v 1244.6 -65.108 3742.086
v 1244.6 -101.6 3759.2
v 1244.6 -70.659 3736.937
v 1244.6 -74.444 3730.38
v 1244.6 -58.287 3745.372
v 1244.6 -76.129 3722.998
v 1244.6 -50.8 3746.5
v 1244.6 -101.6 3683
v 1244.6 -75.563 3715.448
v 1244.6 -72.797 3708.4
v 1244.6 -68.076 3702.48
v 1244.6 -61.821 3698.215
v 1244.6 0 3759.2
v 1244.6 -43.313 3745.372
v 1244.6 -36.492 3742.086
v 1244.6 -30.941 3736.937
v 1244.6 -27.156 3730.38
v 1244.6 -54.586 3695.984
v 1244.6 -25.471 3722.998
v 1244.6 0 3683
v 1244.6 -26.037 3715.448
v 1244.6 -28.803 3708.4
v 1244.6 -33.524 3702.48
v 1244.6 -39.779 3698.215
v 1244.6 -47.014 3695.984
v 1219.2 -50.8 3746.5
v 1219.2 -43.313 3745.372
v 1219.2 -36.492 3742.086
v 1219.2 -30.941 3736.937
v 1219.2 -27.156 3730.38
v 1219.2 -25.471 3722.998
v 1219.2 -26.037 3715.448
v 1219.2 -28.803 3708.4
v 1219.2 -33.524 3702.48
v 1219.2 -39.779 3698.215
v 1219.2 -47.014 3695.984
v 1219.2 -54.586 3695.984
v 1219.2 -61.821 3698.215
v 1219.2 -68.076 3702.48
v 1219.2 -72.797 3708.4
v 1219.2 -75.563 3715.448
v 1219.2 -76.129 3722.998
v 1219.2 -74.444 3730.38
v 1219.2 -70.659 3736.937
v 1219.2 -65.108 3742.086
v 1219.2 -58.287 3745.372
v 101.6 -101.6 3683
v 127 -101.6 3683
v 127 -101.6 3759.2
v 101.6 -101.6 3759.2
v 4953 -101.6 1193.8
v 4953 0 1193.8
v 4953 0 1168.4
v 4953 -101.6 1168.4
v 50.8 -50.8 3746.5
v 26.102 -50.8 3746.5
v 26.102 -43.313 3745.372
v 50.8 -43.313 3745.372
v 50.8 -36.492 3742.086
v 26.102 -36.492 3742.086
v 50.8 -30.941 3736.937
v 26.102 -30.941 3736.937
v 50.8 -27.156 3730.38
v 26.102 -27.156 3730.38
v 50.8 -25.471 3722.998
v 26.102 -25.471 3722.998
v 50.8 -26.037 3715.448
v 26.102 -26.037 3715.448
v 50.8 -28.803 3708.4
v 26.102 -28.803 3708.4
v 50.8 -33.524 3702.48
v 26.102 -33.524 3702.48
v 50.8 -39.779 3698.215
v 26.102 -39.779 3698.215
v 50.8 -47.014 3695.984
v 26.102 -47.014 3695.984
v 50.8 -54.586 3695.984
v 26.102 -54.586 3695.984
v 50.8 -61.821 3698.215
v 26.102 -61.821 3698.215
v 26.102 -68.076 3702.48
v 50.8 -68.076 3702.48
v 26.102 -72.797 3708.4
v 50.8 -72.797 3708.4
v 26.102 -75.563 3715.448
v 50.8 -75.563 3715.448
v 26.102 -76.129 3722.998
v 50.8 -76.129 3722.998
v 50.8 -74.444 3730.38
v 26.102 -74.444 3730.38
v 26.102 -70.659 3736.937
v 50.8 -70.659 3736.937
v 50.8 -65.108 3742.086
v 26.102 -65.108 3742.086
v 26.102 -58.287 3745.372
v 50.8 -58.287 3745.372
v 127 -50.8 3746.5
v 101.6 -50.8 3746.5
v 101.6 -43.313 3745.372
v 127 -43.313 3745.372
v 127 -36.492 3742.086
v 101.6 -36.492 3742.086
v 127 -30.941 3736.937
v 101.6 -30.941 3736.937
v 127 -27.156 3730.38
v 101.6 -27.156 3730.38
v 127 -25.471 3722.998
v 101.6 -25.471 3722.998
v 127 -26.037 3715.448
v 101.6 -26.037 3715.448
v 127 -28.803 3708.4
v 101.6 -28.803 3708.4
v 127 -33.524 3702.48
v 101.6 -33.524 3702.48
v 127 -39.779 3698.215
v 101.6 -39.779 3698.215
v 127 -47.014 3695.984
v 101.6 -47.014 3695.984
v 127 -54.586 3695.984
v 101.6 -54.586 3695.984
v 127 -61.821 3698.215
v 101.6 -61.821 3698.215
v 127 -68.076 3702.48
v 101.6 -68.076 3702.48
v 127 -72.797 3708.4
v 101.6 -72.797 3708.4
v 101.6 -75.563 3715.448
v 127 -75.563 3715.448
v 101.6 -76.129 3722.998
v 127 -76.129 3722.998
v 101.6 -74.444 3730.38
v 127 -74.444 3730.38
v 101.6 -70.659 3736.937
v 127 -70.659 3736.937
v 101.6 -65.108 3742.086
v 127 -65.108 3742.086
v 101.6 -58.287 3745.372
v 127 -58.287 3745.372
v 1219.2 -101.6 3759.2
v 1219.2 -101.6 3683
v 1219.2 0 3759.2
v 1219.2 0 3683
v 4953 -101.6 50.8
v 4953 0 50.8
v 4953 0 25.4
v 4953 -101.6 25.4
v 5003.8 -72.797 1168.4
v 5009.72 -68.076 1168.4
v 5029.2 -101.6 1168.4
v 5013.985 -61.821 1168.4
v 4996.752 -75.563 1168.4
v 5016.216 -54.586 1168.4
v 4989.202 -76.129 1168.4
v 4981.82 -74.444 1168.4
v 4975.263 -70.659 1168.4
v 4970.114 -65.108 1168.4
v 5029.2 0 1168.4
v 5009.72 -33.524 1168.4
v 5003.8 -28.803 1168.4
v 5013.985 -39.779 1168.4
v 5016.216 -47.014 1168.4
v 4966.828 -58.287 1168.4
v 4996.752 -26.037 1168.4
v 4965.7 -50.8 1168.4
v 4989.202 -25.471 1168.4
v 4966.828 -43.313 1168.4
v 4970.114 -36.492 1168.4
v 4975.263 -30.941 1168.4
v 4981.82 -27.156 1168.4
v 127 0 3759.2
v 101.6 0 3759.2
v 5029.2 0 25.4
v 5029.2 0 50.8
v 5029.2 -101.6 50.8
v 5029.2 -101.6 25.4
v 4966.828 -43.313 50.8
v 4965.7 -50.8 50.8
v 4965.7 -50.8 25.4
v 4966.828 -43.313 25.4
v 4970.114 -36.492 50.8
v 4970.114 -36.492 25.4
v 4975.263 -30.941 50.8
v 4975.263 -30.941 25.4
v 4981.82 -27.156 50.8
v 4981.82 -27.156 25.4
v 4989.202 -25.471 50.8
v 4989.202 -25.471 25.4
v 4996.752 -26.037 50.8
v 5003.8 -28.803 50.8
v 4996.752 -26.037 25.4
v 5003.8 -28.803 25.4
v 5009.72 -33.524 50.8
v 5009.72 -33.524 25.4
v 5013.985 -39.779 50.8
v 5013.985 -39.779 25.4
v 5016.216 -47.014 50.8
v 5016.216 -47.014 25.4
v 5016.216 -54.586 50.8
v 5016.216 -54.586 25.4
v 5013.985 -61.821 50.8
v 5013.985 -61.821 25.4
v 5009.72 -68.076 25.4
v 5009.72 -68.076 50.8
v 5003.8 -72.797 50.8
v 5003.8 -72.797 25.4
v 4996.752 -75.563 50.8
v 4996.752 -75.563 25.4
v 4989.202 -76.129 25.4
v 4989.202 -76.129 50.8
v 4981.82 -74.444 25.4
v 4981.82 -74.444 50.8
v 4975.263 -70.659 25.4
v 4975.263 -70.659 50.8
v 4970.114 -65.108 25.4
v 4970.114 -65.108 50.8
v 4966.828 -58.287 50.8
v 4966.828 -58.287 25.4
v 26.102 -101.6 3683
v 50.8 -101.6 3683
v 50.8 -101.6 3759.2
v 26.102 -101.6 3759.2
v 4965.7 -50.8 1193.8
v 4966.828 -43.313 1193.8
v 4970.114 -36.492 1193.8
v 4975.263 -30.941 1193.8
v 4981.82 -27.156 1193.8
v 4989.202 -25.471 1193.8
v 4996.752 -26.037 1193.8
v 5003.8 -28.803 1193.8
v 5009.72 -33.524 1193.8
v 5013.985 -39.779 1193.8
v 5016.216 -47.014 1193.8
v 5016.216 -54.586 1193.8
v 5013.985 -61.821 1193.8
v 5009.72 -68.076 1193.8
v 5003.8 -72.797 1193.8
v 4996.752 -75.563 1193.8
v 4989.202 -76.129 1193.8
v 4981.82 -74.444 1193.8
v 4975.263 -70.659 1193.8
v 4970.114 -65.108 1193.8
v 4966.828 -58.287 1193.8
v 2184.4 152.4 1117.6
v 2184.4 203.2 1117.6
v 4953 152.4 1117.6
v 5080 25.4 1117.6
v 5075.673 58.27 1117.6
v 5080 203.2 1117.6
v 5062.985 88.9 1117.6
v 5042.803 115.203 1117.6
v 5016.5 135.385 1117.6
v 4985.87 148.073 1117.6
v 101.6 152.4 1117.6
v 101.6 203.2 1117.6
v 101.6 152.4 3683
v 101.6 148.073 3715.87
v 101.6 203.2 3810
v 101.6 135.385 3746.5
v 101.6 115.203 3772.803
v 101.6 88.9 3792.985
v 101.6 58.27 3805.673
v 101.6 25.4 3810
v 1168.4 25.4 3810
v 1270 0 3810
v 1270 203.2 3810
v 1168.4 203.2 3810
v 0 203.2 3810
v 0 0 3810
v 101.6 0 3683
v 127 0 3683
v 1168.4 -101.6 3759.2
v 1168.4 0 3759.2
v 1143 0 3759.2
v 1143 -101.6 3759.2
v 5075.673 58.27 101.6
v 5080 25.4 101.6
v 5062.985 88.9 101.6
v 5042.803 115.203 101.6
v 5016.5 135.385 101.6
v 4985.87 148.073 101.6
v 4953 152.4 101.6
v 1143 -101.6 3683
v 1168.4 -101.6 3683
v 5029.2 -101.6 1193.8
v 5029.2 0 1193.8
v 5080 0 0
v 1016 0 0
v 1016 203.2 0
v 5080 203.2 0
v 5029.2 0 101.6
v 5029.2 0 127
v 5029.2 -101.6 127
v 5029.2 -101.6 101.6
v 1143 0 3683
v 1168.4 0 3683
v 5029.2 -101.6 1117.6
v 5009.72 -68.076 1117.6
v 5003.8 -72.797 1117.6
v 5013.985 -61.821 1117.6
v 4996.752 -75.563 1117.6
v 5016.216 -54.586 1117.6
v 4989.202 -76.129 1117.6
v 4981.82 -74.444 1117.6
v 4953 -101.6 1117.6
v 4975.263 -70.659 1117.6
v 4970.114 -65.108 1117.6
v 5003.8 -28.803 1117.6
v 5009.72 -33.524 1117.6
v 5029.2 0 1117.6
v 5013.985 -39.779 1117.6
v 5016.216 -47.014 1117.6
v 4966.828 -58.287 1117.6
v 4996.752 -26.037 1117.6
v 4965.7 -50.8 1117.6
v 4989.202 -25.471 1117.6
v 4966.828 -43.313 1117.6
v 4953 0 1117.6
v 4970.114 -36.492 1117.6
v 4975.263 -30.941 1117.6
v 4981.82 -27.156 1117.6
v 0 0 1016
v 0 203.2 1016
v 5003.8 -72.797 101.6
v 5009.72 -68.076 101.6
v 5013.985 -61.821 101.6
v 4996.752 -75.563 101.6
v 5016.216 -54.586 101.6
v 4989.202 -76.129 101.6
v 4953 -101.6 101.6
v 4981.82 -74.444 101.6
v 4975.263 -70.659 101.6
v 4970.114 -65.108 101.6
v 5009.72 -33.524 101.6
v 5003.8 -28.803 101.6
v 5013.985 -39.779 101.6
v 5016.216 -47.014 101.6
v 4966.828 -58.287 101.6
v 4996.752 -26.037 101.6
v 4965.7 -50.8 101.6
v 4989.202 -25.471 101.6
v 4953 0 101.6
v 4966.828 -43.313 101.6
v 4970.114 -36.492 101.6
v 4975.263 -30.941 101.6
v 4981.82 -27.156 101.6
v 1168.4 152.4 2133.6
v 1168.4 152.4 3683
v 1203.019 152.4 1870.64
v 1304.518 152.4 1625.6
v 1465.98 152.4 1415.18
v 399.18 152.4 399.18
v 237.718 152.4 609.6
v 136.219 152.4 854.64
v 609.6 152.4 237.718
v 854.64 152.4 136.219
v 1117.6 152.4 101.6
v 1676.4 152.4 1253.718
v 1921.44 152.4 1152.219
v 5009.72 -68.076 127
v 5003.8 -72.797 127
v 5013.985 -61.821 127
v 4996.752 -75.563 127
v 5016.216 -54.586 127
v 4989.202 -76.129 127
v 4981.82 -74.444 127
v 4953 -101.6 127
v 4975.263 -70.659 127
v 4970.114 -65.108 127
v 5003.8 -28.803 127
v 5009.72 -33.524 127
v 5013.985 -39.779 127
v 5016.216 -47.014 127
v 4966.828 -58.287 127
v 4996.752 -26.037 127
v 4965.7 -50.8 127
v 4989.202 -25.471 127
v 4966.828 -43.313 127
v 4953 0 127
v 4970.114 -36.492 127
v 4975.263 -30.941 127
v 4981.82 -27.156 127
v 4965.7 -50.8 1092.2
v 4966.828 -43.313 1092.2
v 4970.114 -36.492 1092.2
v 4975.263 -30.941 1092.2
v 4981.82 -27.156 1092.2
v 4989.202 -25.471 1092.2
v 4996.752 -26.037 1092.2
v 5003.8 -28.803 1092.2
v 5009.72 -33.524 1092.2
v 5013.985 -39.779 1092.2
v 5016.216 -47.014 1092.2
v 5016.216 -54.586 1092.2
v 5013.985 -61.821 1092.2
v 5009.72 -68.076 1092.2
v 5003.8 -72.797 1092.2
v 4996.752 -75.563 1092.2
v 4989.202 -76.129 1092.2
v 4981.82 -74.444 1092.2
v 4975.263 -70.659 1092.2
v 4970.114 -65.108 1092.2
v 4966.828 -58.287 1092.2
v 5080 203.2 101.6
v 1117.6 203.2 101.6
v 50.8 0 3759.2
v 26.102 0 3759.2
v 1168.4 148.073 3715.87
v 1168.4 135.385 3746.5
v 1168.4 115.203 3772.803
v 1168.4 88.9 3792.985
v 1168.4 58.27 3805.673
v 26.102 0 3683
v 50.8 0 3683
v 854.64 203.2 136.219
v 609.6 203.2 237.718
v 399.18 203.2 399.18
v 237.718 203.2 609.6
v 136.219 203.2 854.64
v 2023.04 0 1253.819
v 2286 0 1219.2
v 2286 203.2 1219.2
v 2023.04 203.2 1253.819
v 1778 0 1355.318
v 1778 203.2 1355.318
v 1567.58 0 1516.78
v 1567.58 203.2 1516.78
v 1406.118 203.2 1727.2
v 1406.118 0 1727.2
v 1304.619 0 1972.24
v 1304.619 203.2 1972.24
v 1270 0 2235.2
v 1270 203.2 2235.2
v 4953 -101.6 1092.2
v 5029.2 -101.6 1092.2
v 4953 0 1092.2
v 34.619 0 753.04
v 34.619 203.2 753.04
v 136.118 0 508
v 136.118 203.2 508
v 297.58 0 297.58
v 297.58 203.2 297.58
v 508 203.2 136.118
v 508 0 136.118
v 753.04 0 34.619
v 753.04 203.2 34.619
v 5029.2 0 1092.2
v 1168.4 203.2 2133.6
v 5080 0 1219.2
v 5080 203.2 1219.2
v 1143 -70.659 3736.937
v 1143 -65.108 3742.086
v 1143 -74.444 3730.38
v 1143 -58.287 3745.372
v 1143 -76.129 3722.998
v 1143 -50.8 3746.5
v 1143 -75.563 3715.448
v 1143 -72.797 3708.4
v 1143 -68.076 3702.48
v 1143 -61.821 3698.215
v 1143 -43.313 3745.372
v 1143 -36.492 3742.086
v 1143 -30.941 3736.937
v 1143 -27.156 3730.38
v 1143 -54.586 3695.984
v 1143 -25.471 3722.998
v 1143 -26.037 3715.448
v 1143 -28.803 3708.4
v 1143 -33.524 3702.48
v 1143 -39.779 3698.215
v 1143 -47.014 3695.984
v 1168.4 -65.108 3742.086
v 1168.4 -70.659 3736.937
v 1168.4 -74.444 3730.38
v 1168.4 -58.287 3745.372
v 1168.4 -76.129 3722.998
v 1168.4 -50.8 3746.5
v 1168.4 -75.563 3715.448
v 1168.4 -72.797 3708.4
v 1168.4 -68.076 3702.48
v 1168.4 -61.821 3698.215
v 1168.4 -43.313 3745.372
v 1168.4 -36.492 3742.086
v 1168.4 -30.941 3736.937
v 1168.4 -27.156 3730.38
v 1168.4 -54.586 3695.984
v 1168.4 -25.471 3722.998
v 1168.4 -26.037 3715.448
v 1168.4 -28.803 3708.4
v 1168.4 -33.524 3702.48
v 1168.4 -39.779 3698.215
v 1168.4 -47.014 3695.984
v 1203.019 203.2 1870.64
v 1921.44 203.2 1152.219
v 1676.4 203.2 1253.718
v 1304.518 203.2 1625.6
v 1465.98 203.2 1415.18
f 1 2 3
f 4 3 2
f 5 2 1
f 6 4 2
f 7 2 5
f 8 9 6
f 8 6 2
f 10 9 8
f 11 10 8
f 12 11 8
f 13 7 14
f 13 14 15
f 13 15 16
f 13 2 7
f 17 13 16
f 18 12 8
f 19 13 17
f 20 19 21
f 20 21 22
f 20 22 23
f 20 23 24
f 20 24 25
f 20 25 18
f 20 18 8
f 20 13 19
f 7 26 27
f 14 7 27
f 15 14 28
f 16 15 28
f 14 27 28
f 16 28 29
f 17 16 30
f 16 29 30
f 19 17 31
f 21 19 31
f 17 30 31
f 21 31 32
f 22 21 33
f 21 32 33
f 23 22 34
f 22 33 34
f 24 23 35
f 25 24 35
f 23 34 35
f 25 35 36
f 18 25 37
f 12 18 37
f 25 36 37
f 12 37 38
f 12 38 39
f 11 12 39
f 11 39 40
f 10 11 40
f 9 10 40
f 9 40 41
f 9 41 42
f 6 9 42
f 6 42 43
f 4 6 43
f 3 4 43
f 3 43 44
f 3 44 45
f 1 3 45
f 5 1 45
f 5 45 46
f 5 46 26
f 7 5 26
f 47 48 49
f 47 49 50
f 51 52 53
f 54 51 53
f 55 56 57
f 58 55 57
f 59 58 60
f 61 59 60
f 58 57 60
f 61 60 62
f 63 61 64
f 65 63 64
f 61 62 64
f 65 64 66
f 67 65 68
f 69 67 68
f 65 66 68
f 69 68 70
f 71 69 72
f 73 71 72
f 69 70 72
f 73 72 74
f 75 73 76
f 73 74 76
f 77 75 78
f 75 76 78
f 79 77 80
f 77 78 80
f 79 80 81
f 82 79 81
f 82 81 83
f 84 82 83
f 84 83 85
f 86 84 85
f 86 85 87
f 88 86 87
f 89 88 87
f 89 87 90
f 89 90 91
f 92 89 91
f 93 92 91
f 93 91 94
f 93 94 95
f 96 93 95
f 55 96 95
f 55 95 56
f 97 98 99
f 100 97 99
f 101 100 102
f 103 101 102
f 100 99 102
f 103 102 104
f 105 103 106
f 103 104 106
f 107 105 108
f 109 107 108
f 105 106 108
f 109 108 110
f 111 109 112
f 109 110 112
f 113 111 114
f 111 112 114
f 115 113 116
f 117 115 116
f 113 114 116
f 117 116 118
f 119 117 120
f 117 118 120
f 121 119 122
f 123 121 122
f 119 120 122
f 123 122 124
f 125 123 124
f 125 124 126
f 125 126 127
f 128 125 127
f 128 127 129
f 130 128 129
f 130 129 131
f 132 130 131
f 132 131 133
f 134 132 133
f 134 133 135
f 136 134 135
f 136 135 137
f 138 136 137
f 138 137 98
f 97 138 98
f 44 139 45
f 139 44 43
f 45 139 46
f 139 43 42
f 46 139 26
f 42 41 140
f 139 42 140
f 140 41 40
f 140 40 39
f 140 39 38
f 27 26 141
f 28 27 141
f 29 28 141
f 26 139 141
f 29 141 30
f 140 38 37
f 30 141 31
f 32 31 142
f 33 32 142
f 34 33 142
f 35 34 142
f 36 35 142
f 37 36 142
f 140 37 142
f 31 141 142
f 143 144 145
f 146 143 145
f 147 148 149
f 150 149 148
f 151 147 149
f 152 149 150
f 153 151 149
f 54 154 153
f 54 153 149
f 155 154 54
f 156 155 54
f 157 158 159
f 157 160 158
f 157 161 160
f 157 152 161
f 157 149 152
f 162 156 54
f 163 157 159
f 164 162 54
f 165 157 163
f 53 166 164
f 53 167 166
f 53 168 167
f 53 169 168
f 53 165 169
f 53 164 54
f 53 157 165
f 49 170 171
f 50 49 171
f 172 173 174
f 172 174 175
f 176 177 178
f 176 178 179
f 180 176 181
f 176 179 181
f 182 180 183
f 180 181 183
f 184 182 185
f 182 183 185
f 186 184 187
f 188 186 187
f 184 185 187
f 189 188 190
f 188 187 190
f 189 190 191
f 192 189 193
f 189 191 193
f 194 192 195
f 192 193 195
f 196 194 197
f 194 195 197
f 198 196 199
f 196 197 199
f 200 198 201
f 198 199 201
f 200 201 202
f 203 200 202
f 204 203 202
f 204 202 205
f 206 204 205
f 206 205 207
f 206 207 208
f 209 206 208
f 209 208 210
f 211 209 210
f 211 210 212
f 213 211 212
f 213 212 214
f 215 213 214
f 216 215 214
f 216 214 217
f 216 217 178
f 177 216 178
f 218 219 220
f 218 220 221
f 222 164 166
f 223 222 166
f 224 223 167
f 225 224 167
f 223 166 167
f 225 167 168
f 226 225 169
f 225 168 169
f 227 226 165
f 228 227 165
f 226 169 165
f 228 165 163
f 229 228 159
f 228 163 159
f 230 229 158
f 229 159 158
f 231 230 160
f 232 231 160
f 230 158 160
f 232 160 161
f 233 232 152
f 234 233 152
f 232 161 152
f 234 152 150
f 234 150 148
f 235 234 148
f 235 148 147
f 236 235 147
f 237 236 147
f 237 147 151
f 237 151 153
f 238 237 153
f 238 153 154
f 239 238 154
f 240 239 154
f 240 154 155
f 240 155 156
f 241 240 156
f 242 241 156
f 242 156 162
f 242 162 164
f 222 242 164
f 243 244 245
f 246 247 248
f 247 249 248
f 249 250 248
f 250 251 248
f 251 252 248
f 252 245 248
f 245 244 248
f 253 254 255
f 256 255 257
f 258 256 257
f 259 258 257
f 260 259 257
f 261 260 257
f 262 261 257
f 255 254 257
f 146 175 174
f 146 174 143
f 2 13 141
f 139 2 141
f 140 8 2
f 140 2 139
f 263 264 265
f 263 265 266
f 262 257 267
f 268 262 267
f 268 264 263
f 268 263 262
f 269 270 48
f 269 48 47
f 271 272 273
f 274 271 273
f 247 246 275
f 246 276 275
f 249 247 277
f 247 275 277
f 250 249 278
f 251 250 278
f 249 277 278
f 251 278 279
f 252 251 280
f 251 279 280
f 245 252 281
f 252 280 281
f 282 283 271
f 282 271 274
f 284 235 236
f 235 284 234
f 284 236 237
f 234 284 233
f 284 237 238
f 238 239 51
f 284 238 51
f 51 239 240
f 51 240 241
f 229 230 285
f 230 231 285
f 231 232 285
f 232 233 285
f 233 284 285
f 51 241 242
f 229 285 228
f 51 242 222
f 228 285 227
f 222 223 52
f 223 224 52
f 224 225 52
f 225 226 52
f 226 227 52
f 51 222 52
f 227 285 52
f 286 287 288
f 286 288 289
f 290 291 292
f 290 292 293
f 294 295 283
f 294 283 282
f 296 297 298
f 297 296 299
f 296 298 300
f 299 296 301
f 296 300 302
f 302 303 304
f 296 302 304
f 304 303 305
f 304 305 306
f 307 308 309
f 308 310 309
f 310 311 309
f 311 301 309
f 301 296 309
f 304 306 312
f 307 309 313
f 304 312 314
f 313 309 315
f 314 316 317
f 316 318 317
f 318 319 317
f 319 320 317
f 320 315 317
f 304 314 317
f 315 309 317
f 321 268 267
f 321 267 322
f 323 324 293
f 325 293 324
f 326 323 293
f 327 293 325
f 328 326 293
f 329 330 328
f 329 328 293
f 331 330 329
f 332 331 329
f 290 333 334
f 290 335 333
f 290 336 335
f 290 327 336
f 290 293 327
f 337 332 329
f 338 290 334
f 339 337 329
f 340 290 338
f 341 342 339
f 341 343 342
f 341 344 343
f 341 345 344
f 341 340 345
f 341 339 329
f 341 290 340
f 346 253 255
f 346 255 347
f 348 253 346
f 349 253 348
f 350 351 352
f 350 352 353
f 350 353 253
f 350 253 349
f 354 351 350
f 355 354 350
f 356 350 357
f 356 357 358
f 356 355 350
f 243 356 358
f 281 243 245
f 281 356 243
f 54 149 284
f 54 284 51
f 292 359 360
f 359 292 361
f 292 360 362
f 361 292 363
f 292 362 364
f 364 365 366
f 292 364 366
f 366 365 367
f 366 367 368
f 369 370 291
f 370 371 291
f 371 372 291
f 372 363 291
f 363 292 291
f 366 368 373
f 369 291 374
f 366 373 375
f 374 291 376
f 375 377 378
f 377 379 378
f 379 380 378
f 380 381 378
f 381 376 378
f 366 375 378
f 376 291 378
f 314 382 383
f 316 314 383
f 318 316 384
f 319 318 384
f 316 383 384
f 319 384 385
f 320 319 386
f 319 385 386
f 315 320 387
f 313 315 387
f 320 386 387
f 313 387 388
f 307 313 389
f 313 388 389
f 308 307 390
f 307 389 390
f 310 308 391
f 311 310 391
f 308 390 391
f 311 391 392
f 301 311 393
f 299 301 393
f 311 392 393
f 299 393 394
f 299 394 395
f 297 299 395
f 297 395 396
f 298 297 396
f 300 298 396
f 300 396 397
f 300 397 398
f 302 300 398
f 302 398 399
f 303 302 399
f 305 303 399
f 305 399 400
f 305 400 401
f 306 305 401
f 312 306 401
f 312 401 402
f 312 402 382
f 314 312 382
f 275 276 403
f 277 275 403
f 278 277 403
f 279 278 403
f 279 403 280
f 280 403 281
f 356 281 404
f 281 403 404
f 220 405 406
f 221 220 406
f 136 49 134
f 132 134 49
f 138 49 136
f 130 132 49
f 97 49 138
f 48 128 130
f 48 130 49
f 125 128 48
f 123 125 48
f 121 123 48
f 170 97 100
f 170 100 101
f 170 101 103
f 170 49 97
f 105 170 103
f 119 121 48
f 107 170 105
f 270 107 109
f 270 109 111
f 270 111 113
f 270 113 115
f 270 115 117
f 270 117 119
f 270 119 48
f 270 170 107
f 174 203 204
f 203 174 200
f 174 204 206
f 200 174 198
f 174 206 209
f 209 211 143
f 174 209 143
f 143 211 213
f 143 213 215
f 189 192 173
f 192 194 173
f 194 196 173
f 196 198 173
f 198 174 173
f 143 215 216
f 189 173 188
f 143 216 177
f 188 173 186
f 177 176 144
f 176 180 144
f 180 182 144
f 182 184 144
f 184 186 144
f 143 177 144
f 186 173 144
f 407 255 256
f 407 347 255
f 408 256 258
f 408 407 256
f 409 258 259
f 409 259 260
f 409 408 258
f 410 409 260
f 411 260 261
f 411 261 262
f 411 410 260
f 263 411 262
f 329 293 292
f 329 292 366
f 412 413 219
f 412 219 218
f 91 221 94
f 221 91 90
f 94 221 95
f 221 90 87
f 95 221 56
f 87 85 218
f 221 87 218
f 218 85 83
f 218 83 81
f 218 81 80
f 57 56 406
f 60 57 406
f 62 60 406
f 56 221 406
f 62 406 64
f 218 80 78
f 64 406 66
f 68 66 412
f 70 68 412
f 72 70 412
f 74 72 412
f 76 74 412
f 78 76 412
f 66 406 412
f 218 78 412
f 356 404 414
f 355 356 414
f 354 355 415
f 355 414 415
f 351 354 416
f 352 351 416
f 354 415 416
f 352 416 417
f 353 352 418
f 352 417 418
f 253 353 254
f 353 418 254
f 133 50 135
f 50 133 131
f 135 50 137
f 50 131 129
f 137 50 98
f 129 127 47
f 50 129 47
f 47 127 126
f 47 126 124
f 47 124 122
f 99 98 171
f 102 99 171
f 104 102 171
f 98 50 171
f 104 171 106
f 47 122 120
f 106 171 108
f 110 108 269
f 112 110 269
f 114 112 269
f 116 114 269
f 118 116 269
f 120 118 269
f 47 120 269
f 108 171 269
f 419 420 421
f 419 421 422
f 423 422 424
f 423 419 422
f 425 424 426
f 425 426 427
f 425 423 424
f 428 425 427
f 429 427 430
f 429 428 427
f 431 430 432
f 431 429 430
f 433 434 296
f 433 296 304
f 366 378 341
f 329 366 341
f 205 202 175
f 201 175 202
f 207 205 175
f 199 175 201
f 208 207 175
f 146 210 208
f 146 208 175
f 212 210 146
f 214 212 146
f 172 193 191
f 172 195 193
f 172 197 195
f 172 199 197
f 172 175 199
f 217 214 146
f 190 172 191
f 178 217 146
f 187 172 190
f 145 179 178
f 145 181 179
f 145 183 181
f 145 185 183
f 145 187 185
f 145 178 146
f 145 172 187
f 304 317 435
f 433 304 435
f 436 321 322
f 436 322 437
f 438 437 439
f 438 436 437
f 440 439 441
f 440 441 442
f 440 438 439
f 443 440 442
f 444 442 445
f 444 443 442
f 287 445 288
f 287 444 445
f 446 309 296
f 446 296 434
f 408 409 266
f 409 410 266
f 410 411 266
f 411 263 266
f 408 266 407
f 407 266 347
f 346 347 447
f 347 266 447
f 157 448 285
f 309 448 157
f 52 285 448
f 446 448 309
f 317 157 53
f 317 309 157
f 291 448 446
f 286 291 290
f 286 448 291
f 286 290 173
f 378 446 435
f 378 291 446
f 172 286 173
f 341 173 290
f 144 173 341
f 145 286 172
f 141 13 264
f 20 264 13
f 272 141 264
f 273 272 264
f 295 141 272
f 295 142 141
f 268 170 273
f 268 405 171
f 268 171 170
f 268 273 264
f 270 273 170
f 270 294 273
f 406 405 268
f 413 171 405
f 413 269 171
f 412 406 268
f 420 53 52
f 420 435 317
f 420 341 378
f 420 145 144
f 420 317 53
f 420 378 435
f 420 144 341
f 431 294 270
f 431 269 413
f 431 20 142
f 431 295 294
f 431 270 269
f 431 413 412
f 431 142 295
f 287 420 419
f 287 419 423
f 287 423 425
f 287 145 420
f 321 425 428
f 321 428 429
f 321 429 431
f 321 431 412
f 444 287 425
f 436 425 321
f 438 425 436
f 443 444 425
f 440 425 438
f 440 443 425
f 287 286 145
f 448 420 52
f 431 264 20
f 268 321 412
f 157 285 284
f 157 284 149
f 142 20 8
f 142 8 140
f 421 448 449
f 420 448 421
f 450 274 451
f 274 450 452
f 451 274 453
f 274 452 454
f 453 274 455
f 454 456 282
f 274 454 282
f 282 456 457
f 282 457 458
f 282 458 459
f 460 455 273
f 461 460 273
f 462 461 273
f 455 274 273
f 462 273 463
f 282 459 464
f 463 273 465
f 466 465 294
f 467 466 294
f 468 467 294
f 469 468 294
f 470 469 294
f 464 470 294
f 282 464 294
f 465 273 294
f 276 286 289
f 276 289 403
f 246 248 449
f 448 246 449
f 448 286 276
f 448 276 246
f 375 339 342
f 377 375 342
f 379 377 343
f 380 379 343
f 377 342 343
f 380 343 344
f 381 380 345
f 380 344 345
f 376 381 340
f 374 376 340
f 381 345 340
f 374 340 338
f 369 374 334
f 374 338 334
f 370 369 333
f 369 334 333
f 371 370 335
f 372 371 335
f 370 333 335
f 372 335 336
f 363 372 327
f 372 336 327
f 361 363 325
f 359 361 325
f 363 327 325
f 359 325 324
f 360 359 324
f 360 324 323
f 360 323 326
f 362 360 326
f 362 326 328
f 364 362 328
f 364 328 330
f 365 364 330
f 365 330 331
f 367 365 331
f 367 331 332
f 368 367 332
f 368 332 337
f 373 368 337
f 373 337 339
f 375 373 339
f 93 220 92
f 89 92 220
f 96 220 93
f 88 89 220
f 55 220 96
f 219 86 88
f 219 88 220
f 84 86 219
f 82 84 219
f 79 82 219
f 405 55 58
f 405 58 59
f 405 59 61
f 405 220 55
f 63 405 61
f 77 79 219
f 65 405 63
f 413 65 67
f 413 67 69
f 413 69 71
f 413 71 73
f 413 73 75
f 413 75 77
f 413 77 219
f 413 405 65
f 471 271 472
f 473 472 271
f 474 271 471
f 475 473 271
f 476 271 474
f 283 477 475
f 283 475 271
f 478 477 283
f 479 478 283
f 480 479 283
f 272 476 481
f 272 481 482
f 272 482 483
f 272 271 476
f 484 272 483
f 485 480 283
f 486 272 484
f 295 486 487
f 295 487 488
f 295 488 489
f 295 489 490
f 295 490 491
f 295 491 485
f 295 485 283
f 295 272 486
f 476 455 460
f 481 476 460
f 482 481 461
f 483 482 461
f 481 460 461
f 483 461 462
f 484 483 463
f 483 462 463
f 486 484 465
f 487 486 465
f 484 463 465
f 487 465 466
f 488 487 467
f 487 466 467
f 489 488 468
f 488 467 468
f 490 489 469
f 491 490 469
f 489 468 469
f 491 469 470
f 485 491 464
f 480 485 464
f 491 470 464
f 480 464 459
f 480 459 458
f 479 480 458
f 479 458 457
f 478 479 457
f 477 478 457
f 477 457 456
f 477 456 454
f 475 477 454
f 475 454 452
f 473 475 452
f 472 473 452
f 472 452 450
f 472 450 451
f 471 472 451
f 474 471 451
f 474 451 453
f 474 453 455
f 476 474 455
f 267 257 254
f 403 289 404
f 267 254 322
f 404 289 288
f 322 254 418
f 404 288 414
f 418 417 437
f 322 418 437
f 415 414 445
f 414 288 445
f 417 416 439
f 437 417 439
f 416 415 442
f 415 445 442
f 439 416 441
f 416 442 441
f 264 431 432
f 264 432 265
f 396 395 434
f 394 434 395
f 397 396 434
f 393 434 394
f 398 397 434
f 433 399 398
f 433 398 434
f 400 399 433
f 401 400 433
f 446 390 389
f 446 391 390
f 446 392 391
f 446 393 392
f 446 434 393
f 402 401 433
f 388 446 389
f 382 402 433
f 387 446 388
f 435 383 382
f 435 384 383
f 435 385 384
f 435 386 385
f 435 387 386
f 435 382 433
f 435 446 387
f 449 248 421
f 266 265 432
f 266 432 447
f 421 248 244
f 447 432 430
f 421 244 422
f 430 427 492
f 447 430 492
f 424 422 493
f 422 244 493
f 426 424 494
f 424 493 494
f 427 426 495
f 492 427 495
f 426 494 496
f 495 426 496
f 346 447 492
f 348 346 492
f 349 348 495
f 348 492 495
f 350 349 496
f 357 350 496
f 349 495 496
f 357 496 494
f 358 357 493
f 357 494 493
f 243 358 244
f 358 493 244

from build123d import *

# Parameters (mm, degrees)
BOSS_EXTRUDE1_DEPTH = 203.2
CUT_EXTRUDE1_DEPTH  = 50.8
FILLET1_R           = 127
SKETCH3_W           = 76.2
SKETCH3_H           = 25.4
SKETCH3_W_2         = 24.697709427
SKETCH3_H_2         = 76.2
SKETCH3_W_3         = 25.4
BOSS_EXTRUDE2_DEPTH = 101.6
SKETCH4_R           = 25.4
CUT_EXTRUDE2_DEPTH  = 1270
SKETCH5_R           = 25.4
CUT_EXTRUDE3_DEPTH  = 1270


with BuildPart() as part:
    # Sketch1 → Boss-Extrude1 (new body)
    with BuildSketch(Plane(origin=(0, 0, 0), x_dir=(1, 0, 0), z_dir=(0, 1, 0))):
        with BuildLine():
            Line((1016, 0), (5080, 0))
            Line((5080, 0), (5080, -1219.2))
            Line((5080, -1219.2), (2286, -1219.2))
            ThreePointArc((2286, -1219.2), (1567.579510314, -1516.779510314), (1270, -2235.2))
            Line((1270, -2235.2), (1270, -3810))
            Line((1270, -3810), (0, -3810))
            Line((0, -3810), (0, -1016))
            ThreePointArc((0, -1016), (297.579510314, -297.579510314), (1016, 0))
        make_face()
    extrude(amount=BOSS_EXTRUDE1_DEPTH)

    # Sketch2 → Cut-Extrude1 (cut)
    with BuildSketch(Plane(origin=(0, 203.2, 0), x_dir=(1, 0, 0), z_dir=(0, 1, 0))):
        with BuildLine():
            Line((101.6, -1117.6), (101.6, -3810))
            Line((101.6, -3810), (1168.4, -3810))
            Line((1168.4, -3810), (1168.4, -2133.6))
            ThreePointArc((1168.4, -2133.6), (1465.979510314, -1415.179510314), (2184.4, -1117.6))
            Line((2184.4, -1117.6), (5080, -1117.6))
            Line((5080, -1117.6), (5080, -101.6))
            Line((5080, -101.6), (1117.6, -101.6))
            ThreePointArc((1117.6, -101.6), (399.179510314, -399.179510314), (101.6, -1117.6))
        make_face()
    extrude(amount=-CUT_EXTRUDE1_DEPTH, mode=Mode.SUBTRACT)

    # Fillet1
    fillet1_edges = [part.edges().sort_by_distance(p)[0] for p in [
        (5080, 152.4, 609.6),
        (635, 152.4, 3810),
    ]]
    fillet(fillet1_edges, radius=FILLET1_R)

    # Sketch3 → Boss-Extrude2 (add)
    with BuildSketch(Plane(origin=(0, 0, 0), x_dir=(-1, 0, 0), z_dir=(0, -1, 0))):
        with Locations((-4991.1, -38.1)):
            Rectangle(SKETCH3_W, SKETCH3_H)
        with Locations((-4991.1, -114.3)):
            Rectangle(SKETCH3_W, SKETCH3_H)
        with Locations((-4991.1, -1104.9)):
            Rectangle(SKETCH3_W, SKETCH3_H)
        with Locations((-4991.1, -1181.1)):
            Rectangle(SKETCH3_W, SKETCH3_H)
        with Locations((-38.451145287, -3721.1)):
            Rectangle(SKETCH3_W_2, SKETCH3_H_2)
        with Locations((-114.3, -3721.1)):
            Rectangle(SKETCH3_W_3, SKETCH3_H_2)
        with Locations((-1231.9, -3721.1)):
            Rectangle(SKETCH3_W_3, SKETCH3_H_2)
        with Locations((-1155.7, -3721.1)):
            Rectangle(SKETCH3_W_3, SKETCH3_H_2)
    extrude(amount=BOSS_EXTRUDE2_DEPTH)

    # Sketch4 → Cut-Extrude2 (cut)
    with BuildSketch(Plane.ZY.offset(-26.102290573)):
        with Locations((3721.1, -50.8)):
            Circle(SKETCH4_R)
    extrude(amount=-CUT_EXTRUDE2_DEPTH, mode=Mode.SUBTRACT)

    # Sketch5 → Cut-Extrude3 (cut)
    with BuildSketch(Plane(origin=(0, 0, 25.4), x_dir=(-1, 0, 0), z_dir=(0, 0, -1))):
        with Locations((-4991.1, -50.8)):
            Circle(SKETCH5_R)
    extrude(amount=-CUT_EXTRUDE3_DEPTH, mode=Mode.SUBTRACT)


solid = part.part
